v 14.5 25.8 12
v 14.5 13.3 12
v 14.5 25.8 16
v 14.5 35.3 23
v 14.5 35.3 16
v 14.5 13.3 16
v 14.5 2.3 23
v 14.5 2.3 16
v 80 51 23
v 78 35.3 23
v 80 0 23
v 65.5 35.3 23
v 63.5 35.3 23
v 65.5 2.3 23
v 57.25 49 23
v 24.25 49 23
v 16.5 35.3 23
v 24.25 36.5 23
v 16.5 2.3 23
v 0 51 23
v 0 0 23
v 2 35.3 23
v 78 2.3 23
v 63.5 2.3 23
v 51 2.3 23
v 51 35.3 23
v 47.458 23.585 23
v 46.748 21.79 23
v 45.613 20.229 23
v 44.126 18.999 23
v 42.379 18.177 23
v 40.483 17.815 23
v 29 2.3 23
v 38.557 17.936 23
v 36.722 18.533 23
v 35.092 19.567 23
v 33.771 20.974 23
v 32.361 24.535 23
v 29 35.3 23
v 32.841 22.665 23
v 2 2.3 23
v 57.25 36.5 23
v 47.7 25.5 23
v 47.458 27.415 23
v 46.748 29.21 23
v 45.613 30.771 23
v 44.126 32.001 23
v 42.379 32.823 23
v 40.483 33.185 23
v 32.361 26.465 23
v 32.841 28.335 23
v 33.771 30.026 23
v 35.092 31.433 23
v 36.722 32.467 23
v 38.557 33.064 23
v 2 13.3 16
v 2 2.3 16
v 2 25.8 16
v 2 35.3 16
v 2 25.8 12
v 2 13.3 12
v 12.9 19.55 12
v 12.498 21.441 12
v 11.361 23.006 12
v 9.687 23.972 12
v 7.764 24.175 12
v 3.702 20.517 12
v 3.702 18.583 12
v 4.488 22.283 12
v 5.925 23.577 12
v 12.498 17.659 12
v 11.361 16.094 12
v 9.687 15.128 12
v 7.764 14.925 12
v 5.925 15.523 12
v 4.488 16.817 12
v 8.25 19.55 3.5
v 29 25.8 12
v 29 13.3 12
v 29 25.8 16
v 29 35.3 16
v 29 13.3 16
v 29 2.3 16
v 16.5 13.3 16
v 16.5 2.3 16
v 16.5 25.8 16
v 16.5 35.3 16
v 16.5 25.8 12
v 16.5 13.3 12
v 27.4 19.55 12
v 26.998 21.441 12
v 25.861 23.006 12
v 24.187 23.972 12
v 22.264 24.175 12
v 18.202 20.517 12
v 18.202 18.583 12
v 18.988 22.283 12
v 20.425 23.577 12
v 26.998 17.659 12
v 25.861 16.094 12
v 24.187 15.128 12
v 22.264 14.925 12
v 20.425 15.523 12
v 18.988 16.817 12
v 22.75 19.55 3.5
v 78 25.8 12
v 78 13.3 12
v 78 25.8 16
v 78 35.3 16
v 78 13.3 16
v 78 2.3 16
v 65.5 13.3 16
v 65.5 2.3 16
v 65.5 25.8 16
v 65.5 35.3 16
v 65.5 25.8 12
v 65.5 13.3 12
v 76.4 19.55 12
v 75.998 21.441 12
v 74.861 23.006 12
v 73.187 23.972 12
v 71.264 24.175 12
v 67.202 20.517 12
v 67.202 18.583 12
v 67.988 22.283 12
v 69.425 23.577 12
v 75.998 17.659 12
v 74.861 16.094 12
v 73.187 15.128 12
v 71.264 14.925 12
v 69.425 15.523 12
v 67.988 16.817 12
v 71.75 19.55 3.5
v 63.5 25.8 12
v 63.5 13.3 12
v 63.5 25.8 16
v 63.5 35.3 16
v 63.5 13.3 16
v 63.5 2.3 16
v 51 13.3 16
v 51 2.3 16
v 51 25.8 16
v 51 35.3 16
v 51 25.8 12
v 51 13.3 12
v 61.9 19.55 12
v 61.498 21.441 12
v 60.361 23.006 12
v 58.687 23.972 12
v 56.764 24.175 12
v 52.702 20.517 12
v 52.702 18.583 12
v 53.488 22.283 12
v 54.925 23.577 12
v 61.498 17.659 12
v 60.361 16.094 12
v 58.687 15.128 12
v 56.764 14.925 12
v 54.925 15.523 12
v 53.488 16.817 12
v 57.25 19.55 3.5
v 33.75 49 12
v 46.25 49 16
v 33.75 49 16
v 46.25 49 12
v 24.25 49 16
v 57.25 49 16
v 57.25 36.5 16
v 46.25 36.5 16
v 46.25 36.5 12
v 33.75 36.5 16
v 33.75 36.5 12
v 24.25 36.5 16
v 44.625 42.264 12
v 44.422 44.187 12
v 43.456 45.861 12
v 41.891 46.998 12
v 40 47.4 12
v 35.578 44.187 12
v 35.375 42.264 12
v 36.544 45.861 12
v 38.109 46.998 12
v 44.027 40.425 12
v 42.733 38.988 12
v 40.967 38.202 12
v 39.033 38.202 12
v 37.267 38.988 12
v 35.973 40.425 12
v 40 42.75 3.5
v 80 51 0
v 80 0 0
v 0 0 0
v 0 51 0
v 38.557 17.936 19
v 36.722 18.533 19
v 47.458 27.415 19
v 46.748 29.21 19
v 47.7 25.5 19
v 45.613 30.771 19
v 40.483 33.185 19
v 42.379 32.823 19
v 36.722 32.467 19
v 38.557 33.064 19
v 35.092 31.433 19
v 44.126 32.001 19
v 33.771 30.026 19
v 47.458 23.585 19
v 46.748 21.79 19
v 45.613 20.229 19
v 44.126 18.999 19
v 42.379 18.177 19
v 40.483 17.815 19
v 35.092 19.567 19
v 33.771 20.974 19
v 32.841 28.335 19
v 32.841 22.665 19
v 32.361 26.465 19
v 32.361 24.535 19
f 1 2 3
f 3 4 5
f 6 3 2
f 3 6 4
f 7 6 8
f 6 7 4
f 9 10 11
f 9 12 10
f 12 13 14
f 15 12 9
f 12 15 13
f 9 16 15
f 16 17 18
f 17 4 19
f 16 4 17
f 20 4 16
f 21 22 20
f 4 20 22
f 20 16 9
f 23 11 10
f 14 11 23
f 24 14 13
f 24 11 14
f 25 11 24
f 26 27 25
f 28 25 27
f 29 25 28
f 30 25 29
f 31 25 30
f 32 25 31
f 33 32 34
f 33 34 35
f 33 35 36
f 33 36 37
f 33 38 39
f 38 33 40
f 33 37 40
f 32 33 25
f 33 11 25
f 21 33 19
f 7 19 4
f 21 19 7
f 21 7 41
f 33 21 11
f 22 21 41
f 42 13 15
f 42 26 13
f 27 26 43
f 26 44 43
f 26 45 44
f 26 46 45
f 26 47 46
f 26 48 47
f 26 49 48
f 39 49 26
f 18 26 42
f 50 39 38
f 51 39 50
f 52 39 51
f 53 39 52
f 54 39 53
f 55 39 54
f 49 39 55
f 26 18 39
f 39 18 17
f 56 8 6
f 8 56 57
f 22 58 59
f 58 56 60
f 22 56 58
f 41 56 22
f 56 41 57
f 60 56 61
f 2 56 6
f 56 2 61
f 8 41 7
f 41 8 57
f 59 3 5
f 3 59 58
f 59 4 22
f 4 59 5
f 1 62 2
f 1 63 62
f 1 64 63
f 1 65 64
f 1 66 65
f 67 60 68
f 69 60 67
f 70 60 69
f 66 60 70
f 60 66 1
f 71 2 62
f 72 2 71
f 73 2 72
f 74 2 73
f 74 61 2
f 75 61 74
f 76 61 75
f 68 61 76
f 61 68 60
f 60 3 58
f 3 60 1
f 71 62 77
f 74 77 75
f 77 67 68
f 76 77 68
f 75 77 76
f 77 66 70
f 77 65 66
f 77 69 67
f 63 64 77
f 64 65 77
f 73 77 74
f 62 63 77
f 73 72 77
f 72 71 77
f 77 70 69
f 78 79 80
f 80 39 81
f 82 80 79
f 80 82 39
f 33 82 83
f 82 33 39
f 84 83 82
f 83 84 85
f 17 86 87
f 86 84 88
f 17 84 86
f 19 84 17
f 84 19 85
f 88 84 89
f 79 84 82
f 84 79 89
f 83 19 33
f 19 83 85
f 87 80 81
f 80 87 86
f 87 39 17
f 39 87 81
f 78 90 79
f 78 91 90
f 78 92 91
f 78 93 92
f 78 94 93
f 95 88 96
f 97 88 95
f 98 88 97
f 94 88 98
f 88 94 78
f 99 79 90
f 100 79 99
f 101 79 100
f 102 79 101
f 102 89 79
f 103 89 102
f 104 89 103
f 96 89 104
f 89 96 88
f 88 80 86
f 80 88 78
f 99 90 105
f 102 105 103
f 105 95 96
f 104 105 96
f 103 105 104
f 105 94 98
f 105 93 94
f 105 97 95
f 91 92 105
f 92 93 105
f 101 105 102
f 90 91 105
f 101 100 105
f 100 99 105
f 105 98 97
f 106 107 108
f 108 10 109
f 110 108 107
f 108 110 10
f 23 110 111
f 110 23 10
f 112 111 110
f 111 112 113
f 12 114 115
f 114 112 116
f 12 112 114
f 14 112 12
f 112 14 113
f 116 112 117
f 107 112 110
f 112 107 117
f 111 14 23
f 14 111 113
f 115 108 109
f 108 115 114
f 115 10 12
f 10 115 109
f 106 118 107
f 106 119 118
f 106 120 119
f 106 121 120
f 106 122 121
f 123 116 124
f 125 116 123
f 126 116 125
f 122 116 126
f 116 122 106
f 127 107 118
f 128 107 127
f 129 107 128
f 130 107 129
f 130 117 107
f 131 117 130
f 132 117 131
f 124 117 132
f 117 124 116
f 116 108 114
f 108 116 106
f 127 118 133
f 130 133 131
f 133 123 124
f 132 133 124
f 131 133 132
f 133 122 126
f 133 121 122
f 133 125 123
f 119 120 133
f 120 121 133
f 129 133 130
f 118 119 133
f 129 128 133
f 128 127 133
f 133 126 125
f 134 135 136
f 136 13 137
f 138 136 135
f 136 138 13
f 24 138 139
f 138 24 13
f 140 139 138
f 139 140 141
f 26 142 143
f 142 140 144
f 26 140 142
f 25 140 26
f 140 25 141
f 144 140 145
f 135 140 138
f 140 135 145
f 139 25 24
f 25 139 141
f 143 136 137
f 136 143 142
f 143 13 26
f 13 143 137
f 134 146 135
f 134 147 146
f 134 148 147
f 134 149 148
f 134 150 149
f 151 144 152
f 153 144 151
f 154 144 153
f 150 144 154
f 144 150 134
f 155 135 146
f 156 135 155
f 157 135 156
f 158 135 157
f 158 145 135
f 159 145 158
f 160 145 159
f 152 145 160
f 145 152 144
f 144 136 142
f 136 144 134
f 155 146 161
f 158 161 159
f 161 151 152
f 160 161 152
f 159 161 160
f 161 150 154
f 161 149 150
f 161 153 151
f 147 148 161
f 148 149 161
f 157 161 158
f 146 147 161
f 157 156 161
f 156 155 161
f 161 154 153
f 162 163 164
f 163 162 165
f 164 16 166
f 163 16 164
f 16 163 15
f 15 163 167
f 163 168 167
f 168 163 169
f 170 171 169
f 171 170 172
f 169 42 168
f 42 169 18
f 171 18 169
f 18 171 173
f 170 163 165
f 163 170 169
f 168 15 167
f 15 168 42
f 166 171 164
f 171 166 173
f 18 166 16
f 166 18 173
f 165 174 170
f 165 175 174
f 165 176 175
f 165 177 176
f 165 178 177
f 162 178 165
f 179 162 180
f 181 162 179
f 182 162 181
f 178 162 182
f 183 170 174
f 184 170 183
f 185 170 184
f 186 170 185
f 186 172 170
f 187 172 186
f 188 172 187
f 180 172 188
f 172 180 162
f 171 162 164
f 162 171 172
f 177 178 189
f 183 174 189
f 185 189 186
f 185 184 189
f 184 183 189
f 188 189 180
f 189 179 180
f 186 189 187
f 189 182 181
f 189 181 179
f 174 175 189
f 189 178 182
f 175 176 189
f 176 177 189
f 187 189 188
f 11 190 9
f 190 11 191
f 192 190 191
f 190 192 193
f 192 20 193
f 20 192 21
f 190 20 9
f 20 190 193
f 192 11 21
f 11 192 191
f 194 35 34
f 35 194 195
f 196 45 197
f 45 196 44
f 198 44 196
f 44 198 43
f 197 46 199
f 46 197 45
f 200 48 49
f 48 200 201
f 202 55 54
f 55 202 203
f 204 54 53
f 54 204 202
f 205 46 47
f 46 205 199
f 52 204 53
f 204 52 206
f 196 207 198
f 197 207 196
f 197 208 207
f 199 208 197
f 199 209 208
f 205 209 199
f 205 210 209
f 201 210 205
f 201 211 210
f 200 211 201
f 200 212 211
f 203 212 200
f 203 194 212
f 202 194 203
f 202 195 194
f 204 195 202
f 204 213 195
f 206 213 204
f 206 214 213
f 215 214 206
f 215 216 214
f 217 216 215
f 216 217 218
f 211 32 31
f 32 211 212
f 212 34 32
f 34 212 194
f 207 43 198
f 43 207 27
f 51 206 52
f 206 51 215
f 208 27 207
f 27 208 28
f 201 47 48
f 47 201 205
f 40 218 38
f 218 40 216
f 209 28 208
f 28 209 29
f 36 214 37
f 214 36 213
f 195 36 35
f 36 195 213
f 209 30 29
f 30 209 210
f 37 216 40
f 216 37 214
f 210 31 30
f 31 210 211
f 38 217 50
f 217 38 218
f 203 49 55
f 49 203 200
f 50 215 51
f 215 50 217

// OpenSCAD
length = 80;
width = 51;
height = 23;

magnetPadding = 15;
magnetBaseInnerDiameter = 15.4;
magnetHeight = 4.0;

// translate([0,0,7.5])
// 
// 
// radius 8.8
// height 8
// total height 17.5
pyramidHeight = 8 + .5;
pyramidDiameter = 8.8 + .5;

boxLength = 12.5;
boxWidth = 12.5;
boxHeight = 19.5 - pyramidHeight;
fingerNotchSize = 11;
boxRemainder = 4;
spaceBetweenBoxes = 3;
//

 difference(){
    cube([length, width, height]);
     translate([2,pyramidDiameter + 2 + 2,height - (pyramidHeight + boxHeight)])
        Pyramid();
     translate([2 + 2 + boxWidth,pyramidDiameter + 2 + 2,height - (pyramidHeight + boxHeight)])
        Pyramid();
     translate([length - (2 + boxWidth),pyramidDiameter + 2 + 2,height - (pyramidHeight + boxHeight)])
        Pyramid();
     translate([length - (2 + 2 + boxWidth + boxWidth),pyramidDiameter + 2 + 2,height - (pyramidHeight + boxHeight)])
        Pyramid();
     
     translate([length/2 + boxWidth/2, width - (boxLength + 2), height - (pyramidHeight + boxHeight)])
        rotate([0,0,90])
            Pyramid();
     
     translate([
            length/2,
            width/2,
            height - magnetHeight])
            cylinder(magnetHeight, d=magnetBaseInnerDiameter);
//     translate([5 + boxLength + spaceBetweenBoxes,15,height - (pyramidHeight + boxHeight)])
//        Pyramid();
 }

module Pyramid()
{
    union()
    {
        translate([0, -fingerNotchSize, pyramidHeight + boxRemainder])
            cube([boxLength, fingerNotchSize, boxHeight - boxRemainder]);
        translate([0, fingerNotchSize, pyramidHeight + boxRemainder])
            cube([boxLength, fingerNotchSize, boxHeight - boxRemainder]);
        translate([0, 0, pyramidHeight])
            cube([boxLength, boxWidth, boxHeight]);
        rotate([180, 0, 0])
            translate([boxLength/2, -boxWidth/2, -pyramidHeight/2])
                cylinder(h=pyramidHeight, r1=pyramidDiameter/2, r2=0, center=true);
    }
}
